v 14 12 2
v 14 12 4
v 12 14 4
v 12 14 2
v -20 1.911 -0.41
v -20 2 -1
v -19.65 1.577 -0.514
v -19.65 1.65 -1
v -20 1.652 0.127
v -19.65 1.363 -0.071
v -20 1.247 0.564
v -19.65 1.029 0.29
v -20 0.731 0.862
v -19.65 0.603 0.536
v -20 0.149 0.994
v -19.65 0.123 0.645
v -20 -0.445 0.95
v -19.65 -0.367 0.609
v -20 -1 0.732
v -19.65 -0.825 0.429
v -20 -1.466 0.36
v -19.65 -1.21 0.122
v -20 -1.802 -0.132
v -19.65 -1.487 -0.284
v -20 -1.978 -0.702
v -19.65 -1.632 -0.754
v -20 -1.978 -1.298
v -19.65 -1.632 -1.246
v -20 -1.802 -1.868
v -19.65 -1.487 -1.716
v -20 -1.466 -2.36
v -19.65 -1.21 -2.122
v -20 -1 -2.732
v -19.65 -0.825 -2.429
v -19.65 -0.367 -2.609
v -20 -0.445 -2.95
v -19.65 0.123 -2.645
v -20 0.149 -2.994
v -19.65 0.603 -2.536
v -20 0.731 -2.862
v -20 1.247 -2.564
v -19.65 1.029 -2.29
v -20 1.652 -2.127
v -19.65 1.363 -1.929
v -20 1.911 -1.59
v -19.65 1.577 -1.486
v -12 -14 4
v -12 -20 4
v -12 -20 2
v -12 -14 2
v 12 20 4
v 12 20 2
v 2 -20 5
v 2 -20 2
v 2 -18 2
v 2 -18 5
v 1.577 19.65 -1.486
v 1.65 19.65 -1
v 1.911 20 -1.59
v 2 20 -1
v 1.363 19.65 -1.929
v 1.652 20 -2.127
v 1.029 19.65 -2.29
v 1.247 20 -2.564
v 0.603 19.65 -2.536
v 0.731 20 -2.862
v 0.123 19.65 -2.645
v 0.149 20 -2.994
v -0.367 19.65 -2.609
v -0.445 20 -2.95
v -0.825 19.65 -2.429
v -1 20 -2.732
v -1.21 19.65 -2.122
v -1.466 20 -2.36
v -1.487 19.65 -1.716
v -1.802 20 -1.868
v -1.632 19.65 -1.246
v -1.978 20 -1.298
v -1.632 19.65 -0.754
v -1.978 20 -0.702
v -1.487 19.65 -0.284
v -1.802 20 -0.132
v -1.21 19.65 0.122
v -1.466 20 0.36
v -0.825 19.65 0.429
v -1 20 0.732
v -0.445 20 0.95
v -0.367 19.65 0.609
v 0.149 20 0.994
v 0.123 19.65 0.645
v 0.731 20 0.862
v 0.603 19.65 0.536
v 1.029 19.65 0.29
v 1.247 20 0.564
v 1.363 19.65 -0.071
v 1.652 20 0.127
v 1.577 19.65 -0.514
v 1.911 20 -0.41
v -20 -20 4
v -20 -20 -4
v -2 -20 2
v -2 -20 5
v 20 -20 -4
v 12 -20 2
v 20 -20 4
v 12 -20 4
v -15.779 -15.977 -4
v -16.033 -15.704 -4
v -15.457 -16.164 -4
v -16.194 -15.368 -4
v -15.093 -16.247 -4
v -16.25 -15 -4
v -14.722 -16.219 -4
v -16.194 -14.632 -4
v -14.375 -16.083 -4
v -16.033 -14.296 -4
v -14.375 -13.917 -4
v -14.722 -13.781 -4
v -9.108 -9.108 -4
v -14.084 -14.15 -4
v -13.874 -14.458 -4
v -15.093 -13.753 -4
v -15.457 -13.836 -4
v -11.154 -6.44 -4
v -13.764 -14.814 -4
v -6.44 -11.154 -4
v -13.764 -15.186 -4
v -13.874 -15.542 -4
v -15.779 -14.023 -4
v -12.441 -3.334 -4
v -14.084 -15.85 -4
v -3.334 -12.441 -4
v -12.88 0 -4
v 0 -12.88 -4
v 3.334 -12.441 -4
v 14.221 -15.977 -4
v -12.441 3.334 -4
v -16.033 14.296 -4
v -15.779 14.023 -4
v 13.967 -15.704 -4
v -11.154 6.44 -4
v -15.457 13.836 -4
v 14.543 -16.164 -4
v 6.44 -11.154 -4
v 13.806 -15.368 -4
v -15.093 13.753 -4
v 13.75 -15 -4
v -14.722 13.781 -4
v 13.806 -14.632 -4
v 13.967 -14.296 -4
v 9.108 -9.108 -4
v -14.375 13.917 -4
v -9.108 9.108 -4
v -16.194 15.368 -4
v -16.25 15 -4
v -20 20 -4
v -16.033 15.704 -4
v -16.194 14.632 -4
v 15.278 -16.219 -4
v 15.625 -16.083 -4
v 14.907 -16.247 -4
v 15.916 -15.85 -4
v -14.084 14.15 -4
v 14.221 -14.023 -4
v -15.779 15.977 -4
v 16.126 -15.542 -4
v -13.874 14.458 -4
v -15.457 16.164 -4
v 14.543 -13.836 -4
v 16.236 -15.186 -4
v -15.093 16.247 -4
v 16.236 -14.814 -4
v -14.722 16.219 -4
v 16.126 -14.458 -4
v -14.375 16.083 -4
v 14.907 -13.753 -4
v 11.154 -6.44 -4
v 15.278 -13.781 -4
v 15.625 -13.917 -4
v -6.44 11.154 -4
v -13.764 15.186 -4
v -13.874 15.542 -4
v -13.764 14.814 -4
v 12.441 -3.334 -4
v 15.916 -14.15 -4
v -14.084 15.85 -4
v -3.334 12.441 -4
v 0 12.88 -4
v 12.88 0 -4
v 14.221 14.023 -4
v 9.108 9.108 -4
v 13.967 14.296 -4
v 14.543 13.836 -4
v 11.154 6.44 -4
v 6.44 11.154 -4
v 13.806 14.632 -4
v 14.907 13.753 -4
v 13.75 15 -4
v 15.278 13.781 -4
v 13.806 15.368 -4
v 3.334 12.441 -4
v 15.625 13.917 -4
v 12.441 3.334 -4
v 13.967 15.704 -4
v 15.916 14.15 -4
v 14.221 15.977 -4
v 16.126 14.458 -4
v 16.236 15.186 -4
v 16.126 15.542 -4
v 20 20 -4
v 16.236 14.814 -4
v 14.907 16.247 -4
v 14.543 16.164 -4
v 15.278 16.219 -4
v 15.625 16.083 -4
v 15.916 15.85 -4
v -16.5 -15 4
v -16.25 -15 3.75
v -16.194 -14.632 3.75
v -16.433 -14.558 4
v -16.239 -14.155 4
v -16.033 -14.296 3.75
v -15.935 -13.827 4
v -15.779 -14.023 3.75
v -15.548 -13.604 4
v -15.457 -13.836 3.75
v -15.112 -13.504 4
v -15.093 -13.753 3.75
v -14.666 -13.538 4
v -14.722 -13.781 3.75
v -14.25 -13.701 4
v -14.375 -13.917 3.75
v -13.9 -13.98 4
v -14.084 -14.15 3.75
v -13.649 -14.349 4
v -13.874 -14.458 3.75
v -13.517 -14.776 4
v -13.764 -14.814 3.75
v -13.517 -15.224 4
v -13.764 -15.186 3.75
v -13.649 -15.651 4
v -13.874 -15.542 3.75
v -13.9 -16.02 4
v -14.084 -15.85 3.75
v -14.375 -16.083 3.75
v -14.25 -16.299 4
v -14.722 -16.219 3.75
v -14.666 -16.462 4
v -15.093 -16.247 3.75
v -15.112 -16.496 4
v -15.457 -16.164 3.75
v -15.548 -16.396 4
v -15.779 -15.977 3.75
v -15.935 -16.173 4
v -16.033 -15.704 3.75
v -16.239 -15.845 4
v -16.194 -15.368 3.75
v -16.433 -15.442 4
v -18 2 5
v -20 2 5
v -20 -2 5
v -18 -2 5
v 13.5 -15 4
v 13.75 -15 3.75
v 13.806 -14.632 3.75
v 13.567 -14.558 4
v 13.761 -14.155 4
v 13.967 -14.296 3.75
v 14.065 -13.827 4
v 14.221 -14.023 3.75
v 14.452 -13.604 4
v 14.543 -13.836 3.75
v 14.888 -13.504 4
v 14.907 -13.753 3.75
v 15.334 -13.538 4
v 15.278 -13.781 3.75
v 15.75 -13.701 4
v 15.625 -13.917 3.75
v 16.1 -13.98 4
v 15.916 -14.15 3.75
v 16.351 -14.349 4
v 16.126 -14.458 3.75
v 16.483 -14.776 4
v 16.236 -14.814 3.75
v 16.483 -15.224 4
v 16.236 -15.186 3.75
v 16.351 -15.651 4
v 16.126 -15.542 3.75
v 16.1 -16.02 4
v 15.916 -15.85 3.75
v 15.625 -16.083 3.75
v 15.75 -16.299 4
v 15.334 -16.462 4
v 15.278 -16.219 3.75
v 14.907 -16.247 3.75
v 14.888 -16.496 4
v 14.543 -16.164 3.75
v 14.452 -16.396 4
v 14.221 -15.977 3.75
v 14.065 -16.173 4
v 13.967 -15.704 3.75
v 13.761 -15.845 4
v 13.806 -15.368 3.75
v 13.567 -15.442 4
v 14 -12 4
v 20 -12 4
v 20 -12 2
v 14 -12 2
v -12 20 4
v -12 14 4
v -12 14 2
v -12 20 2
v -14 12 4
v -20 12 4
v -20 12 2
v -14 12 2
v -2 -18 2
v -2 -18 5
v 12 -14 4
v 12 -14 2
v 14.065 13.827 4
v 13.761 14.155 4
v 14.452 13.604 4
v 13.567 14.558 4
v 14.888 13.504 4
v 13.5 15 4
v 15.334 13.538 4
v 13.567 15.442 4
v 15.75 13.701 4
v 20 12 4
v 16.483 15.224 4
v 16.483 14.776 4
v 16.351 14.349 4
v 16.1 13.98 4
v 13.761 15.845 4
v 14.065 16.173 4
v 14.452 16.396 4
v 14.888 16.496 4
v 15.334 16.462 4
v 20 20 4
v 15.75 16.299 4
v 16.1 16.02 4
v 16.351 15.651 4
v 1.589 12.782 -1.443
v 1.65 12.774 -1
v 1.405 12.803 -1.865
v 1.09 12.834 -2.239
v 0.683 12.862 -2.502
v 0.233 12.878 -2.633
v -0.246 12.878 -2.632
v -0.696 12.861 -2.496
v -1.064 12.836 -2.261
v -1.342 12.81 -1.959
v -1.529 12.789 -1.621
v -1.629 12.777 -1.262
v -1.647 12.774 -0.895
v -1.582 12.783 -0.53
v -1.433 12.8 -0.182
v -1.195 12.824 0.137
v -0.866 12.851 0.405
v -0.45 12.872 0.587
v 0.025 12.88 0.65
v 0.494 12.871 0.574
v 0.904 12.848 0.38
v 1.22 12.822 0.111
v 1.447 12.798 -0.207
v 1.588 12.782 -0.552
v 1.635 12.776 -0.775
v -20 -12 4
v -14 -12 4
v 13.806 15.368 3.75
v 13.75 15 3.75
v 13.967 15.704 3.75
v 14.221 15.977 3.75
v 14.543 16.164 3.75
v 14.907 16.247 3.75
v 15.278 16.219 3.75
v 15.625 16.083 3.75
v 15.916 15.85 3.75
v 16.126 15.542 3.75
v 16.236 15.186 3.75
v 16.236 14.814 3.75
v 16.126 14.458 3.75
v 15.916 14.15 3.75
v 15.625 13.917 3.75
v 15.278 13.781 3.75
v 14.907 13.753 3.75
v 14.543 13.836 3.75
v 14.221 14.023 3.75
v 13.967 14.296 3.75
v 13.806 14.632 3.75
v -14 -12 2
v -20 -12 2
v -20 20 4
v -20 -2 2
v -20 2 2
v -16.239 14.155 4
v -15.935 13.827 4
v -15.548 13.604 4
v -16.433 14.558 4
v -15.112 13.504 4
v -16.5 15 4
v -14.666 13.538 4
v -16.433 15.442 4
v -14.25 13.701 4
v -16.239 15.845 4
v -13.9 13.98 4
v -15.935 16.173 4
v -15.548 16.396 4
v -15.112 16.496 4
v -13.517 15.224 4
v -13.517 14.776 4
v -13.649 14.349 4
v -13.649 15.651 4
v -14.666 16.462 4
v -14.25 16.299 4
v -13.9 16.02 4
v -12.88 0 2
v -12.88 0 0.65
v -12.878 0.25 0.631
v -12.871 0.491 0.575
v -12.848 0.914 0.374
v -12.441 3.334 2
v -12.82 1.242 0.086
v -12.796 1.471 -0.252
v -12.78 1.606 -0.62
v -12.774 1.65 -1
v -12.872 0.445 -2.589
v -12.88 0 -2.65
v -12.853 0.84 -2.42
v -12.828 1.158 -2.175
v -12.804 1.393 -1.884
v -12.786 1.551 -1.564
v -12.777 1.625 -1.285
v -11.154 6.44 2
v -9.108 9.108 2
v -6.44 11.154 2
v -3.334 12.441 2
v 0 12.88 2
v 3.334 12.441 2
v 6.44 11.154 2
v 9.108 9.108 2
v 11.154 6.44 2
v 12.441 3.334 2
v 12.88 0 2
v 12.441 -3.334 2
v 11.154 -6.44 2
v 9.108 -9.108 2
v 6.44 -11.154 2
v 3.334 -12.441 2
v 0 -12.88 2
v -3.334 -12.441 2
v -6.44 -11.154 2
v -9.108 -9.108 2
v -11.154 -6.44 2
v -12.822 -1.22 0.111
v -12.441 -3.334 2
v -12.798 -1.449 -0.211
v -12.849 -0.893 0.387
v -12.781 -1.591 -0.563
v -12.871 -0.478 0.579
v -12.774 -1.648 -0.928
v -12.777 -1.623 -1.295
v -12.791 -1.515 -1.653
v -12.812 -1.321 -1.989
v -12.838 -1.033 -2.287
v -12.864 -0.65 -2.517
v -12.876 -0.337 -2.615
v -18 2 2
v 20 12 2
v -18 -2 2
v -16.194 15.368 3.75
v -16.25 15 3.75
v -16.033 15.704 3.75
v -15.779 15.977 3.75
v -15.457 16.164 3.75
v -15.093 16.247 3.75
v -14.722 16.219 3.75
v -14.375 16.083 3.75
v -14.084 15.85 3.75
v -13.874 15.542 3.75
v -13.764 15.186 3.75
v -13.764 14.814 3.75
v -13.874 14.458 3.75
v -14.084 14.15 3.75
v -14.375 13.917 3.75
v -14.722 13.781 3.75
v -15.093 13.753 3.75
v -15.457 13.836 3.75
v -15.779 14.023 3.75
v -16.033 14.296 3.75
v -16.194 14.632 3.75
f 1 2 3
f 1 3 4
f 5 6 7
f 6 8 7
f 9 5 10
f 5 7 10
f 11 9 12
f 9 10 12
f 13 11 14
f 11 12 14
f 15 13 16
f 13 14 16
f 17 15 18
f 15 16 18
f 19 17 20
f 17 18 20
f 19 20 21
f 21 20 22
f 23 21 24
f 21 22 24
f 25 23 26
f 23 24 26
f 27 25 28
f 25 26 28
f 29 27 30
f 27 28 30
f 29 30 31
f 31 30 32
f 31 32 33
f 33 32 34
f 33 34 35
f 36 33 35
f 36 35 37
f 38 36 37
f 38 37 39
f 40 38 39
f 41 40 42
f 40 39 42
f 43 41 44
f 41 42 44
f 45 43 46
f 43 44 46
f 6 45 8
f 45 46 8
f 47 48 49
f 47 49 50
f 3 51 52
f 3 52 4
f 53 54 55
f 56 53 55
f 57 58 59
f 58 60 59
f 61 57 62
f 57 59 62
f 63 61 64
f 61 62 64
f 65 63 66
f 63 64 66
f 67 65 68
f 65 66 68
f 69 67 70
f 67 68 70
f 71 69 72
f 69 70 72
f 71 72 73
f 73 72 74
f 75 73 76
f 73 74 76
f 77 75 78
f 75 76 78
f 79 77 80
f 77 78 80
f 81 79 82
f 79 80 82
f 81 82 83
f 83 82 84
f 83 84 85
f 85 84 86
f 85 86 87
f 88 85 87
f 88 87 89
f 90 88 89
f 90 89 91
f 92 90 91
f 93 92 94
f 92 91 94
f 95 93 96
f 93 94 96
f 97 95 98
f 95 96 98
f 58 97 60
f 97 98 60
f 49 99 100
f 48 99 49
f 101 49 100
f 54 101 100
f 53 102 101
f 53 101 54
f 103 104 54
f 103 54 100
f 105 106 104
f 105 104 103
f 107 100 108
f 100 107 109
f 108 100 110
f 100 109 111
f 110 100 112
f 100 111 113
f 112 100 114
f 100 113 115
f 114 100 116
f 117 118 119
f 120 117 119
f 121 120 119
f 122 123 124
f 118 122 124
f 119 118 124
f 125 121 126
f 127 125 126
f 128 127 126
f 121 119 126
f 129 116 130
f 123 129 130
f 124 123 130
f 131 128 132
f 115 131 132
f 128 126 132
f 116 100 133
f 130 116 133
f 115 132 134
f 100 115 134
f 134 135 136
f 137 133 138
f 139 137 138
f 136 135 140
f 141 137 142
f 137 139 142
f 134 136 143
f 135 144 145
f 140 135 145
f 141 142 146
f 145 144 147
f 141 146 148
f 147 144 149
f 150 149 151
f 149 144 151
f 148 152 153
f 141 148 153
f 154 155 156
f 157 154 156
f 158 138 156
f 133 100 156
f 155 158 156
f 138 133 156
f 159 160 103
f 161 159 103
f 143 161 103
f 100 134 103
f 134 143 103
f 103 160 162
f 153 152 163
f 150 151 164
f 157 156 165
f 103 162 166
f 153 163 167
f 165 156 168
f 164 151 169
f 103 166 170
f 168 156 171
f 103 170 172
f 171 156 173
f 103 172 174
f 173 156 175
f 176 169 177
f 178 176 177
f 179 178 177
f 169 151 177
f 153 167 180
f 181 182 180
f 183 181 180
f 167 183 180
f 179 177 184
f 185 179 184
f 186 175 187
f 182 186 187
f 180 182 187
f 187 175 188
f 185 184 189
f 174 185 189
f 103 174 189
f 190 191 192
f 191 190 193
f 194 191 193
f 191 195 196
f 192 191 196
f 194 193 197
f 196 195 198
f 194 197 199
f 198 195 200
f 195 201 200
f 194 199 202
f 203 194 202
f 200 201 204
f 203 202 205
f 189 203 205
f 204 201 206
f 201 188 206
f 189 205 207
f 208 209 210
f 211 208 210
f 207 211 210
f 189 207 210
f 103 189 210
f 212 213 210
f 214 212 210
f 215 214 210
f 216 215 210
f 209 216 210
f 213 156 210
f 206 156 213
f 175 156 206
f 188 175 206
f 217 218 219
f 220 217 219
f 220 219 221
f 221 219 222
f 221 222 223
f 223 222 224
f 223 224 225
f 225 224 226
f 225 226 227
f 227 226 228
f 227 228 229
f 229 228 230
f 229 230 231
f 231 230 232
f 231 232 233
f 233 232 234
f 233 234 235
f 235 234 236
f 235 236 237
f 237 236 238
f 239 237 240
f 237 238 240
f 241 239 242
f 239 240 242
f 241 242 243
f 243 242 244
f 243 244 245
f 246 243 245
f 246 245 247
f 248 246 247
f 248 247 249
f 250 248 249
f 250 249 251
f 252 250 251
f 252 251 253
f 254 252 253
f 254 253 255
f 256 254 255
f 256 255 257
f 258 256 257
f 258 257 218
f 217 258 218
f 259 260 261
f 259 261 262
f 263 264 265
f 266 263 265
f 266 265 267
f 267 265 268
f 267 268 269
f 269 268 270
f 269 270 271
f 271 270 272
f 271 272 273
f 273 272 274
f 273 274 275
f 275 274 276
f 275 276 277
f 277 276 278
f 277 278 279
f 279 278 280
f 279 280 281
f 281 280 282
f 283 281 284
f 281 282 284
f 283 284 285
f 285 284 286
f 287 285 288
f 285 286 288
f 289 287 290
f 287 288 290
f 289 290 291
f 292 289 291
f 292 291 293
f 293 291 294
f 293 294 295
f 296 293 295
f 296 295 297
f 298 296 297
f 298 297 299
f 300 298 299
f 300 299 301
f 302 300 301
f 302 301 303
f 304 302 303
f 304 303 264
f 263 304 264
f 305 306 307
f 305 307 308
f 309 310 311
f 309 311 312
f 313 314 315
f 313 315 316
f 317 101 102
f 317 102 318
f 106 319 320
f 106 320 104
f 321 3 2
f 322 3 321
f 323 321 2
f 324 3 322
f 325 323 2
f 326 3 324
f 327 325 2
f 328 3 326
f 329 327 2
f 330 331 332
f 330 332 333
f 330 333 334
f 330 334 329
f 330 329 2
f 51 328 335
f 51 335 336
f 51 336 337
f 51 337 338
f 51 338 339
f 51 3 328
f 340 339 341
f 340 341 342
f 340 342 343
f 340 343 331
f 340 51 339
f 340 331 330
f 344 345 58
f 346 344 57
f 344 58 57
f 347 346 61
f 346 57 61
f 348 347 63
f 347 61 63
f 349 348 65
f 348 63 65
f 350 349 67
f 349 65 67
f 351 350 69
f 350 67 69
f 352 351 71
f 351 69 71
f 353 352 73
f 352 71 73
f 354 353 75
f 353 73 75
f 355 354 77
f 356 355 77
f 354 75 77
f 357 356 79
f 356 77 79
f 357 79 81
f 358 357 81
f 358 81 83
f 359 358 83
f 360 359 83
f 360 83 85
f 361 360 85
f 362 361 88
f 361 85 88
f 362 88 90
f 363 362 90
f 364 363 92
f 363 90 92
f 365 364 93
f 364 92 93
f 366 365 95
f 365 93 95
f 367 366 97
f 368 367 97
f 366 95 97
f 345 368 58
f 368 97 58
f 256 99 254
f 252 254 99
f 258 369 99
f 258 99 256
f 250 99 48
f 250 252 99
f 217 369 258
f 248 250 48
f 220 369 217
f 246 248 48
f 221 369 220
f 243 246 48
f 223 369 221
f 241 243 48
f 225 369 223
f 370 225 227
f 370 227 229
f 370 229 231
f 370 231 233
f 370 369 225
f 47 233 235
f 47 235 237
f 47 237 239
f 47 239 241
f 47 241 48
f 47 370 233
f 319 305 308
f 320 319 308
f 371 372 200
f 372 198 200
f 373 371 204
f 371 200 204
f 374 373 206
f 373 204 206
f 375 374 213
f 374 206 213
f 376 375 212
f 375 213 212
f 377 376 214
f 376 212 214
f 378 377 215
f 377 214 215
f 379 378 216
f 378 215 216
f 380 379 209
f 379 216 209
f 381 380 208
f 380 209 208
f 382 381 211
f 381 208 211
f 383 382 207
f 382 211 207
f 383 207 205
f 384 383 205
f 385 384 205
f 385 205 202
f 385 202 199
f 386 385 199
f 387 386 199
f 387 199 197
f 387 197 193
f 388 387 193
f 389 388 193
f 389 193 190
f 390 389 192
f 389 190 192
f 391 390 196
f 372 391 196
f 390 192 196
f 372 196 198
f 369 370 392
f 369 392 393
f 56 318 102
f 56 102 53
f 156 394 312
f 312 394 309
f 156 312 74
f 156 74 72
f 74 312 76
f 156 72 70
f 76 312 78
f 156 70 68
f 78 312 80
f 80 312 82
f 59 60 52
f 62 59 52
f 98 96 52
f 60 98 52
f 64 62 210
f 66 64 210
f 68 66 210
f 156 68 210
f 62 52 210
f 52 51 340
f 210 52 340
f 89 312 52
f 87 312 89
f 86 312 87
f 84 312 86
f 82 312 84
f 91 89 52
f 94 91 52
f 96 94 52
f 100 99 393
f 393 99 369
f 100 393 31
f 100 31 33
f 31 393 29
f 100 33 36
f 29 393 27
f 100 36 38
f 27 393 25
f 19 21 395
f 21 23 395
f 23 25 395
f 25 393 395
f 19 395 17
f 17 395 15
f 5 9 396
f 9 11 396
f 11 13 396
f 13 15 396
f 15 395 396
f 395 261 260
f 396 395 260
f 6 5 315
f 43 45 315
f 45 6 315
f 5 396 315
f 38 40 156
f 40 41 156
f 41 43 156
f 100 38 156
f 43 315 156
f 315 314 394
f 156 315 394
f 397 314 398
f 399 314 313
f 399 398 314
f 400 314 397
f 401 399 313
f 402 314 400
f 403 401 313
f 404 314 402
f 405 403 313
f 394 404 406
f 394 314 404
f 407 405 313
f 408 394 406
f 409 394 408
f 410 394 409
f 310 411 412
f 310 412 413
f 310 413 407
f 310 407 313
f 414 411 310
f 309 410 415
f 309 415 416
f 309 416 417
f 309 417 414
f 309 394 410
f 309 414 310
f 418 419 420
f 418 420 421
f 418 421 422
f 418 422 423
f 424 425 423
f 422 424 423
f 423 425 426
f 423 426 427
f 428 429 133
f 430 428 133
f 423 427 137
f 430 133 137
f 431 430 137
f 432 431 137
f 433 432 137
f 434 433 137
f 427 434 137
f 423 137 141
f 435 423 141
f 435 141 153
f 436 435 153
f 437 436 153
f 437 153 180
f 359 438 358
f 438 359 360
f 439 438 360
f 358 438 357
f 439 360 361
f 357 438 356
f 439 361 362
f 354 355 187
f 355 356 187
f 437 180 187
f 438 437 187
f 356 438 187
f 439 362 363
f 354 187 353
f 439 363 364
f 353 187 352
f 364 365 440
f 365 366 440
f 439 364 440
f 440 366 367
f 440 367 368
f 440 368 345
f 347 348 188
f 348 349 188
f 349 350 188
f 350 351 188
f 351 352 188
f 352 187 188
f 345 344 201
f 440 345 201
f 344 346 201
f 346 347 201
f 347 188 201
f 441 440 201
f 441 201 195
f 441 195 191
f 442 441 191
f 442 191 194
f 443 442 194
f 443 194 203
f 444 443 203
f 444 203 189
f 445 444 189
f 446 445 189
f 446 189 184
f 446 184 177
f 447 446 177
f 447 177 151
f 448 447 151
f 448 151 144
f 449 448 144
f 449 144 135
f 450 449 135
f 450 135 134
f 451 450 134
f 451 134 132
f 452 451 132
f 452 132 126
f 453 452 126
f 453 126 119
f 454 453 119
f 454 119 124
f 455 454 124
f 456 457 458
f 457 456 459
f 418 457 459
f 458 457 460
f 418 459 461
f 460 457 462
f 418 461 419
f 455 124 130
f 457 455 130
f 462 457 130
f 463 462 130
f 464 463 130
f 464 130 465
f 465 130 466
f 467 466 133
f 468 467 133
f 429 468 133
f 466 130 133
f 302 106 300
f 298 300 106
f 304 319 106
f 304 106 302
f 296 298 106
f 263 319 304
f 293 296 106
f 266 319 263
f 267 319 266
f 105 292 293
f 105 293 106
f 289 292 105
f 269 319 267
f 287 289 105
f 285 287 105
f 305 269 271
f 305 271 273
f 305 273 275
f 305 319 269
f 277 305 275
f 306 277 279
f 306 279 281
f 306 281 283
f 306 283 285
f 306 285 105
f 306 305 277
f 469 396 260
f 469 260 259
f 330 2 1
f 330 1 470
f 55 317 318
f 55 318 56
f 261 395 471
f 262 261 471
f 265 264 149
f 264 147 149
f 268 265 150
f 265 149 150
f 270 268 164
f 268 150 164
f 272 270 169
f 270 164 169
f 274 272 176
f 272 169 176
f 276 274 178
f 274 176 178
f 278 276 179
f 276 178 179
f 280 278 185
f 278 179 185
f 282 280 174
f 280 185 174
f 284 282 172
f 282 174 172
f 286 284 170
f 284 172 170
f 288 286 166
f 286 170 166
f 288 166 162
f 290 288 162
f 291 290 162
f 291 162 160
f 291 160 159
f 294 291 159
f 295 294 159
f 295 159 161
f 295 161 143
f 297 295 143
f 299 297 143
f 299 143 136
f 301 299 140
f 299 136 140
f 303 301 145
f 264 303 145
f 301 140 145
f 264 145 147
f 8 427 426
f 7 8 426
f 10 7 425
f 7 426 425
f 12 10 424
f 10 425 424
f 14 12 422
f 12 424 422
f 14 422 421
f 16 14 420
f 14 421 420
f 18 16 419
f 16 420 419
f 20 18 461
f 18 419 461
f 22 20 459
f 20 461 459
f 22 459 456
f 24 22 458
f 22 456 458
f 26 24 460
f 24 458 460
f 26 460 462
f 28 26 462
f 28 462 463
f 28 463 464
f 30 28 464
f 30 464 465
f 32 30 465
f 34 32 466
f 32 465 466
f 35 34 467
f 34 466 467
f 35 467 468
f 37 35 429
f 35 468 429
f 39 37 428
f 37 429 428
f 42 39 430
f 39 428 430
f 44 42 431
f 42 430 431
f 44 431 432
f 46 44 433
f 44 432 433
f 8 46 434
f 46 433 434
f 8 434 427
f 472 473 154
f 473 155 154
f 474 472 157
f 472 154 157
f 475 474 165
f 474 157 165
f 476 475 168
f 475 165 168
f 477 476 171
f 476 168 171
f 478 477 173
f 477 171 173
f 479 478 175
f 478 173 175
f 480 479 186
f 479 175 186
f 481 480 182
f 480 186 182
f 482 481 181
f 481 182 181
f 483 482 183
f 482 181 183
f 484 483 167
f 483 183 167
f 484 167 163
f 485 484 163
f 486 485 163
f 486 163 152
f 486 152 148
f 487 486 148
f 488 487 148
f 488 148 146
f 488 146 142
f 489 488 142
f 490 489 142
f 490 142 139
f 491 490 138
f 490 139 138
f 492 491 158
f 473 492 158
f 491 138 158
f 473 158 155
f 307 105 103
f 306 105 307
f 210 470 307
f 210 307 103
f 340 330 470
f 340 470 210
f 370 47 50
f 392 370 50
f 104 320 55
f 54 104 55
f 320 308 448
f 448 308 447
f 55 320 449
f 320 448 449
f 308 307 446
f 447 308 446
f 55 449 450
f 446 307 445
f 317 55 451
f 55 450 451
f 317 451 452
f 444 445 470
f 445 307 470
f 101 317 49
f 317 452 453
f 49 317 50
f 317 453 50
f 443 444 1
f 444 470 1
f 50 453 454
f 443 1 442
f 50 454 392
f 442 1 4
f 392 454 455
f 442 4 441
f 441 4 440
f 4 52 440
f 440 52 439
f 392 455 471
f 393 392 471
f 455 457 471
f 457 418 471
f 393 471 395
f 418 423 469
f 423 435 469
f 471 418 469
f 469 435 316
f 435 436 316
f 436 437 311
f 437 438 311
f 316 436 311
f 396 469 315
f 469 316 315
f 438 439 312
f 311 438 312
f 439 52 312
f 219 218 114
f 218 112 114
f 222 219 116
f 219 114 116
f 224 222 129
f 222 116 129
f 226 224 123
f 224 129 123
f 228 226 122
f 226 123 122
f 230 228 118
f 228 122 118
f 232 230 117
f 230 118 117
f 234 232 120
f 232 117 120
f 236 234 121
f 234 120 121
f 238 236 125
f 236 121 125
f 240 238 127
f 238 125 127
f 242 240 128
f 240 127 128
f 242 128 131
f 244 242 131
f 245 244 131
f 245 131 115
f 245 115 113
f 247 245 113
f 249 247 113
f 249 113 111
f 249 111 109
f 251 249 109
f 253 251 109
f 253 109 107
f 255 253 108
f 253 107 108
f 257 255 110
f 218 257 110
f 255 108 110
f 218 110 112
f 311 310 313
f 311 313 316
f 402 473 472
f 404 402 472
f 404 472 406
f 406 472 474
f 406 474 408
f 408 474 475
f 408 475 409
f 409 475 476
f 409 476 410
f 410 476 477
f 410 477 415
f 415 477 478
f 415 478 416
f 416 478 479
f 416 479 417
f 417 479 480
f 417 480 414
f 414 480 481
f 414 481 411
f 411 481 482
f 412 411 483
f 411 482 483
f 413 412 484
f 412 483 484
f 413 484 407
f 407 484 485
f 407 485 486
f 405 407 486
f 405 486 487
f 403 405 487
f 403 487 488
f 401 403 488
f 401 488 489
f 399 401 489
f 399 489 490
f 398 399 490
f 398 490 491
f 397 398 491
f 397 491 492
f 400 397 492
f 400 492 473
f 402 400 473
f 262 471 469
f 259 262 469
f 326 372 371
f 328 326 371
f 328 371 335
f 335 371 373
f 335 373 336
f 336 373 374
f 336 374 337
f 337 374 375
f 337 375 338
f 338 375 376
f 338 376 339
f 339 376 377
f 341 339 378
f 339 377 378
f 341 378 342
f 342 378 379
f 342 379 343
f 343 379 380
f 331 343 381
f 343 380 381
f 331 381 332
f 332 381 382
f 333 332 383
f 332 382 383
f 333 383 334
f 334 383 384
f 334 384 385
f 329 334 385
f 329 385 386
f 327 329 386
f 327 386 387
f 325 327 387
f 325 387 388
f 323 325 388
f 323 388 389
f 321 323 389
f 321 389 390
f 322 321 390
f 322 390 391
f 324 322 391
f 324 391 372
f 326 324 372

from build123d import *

# Parameters (mm, degrees)
SKETCH1_W                       = 40
SKETCH1_H                       = 40
BOSS_EXTRUDE1_DEPTH             = 4
M3X0_5_TAPPED_HOLE1_D           = 2.5
M3X0_5_TAPPED_HOLE1_CSINK_D     = 3
M3X0_5_TAPPED_HOLE1_CSINK_ANGLE = 90
CUT_EXTRUDE1_DEPTH              = 2
CHAMFER1_SIZE                   = 2
SKETCH7_W                       = 2
SKETCH7_H                       = 4
SKETCH7_W_2                     = 4
SKETCH7_H_2                     = 2
BOSS_EXTRUDE2_DEPTH             = 3
SKETCH12_R                      = 12.88
CUT_EXTRUDE2_DEPTH              = 30.681644159


# Read off the part's stored shape, not the designer's step: M4x0.7 Tapped Hole1, M4x0.7 Tapped Hole2
with BuildPart() as part:
    # Sketch1 → Boss-Extrude1 (new, symmetric)
    with BuildSketch(Plane.XY):
        Rectangle(SKETCH1_W, SKETCH1_H)
    extrude(amount=BOSS_EXTRUDE1_DEPTH, both=True)

    # M3x0.5 Tapped Hole1 (through all)
    with Locations(Plane.XY.offset(4)):
        with Locations((-15, 15), (15, 15), (15, -15), (-15, -15)):
            CounterSinkHole(M3X0_5_TAPPED_HOLE1_D / 2, M3X0_5_TAPPED_HOLE1_CSINK_D / 2, counter_sink_angle=M3X0_5_TAPPED_HOLE1_CSINK_ANGLE)

    # Sketch6 → Cut-Extrude1 (cut)
    with BuildSketch(Plane.XY.offset(4)):
        Polygon((-20, 12), (-12, 12), (-12, 20), (12, 20), (12, 12), (20, 12), (20, -12), (12, -12), (12, -20), (-12, -20), (-12, -12), (-20, -12), align=None)
    extrude(amount=-CUT_EXTRUDE1_DEPTH, mode=Mode.SUBTRACT)

    # Chamfer1
    chamfer1_edges = [part.edges().sort_by_distance(p)[0] for p in [
        (-12, 12, 3),
        (12, 12, 3),
        (12, -12, 3),
        (-12, -12, 3),
    ]]
    chamfer(chamfer1_edges, length=CHAMFER1_SIZE)

    # Sketch7 → Boss-Extrude2 (add)
    with BuildSketch(Plane.XY.offset(2)):
        with Locations((-19, 0)):
            Rectangle(SKETCH7_W, SKETCH7_H)
        with Locations((0, -19)):
            Rectangle(SKETCH7_W_2, SKETCH7_H_2)
    extrude(amount=BOSS_EXTRUDE2_DEPTH)

    # Sketch12 → Cut-Extrude2 (cut, through all)
    with BuildSketch(Plane(origin=(0, 0, -4), x_dir=(-1, 0, 0), z_dir=(0, 0, -1))):
        Circle(SKETCH12_R)
    extrude(amount=-CUT_EXTRUDE2_DEPTH, mode=Mode.SUBTRACT)

    # M4x0.7 Tapped Hole1 outline → M4x0.7 Tapped Hole1 (revolve, cut)
    with BuildSketch(Plane.XY.offset(-1)):
        Polygon((0, 12.773860334), (1.65, 12.773860334), (1.65, 19.65), (2, 20), (0, 20), align=None)
    revolve(axis=Axis((0, 0, -1), (0, 1, 0)), mode=Mode.SUBTRACT)

    # M4x0.7 Tapped Hole2 outline → M4x0.7 Tapped Hole2 (revolve, cut)
    with BuildSketch(Plane.YX.offset(1)):
        Polygon((1.65, -19.65), (1.65, -12.773829877), (0, -12.773829877), (0, -20), (2, -20), align=None)
    revolve(axis=Axis((0, 0, -1), (1, 0, 0)), mode=Mode.SUBTRACT)


solid = part.part
